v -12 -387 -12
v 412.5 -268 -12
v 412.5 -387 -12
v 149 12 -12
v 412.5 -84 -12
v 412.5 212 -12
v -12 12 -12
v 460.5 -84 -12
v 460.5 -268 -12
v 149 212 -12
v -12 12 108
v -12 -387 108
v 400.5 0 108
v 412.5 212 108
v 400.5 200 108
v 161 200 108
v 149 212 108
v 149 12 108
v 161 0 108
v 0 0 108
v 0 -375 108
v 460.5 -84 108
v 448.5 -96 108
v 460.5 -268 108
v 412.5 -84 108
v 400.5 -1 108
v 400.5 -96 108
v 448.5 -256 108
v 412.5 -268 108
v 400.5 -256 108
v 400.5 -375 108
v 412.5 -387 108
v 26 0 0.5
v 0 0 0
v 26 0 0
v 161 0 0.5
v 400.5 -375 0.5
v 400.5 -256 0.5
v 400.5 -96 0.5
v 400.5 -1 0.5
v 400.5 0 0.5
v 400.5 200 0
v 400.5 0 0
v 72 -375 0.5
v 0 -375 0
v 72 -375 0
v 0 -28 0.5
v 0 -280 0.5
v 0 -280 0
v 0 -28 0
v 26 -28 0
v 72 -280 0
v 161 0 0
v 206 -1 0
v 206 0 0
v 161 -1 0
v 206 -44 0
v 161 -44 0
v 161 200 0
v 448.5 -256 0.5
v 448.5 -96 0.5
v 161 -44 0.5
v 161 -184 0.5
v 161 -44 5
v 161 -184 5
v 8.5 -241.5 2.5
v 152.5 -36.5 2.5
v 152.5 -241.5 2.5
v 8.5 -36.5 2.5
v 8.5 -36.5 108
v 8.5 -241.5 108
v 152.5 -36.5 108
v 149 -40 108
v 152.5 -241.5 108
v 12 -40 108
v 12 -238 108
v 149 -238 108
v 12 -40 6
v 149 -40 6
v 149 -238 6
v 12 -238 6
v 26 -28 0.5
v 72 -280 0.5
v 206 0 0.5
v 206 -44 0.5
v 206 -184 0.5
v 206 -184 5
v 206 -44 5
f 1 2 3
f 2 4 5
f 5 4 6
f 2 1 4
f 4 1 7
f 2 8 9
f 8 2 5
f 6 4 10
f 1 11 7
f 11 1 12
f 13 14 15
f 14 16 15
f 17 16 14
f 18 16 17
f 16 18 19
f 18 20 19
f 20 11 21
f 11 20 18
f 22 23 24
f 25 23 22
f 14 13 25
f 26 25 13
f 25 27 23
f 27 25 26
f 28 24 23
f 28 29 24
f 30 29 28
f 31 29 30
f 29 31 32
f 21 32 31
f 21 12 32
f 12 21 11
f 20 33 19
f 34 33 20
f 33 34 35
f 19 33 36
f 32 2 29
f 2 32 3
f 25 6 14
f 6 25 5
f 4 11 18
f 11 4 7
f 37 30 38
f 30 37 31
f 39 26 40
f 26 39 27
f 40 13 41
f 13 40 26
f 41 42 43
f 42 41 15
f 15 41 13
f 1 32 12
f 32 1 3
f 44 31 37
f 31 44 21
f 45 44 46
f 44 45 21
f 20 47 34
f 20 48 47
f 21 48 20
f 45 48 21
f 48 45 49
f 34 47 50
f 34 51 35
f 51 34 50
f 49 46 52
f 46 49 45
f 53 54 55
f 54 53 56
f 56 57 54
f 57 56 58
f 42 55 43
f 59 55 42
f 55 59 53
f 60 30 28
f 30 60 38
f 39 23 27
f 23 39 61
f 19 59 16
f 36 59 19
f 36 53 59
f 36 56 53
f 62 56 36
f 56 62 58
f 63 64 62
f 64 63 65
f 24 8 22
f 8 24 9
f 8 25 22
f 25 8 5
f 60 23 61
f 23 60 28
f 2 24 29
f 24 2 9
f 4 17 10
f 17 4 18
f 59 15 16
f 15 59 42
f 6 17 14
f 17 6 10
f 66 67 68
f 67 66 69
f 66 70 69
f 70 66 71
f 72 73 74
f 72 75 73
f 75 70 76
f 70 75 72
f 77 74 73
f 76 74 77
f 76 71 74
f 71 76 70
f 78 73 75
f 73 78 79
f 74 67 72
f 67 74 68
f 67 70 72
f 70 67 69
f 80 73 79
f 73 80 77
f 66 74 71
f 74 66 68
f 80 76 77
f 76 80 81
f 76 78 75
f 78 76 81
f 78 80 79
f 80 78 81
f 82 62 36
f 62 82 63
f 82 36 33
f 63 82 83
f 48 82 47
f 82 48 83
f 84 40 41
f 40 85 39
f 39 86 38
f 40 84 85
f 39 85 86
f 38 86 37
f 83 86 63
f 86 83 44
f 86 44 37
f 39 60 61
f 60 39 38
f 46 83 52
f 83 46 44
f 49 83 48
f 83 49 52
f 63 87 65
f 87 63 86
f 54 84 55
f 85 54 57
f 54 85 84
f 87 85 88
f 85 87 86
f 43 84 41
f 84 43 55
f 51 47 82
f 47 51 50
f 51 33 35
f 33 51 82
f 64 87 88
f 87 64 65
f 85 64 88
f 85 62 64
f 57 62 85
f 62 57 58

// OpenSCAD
// Jim's basement recording studio
// all units in inches

concrete_height = 9 * 12;
slab_thickness = 12;

basement = [400.5, 375, concrete_height];
jutout = [48, 160];

// Original uncarpeted area:
//studio = [161, 173];

// Alloted space from back wall:
studio = [161,250];
// Useless corner space dedicated to water main pipe and valve:
nw_corner_water_main = [26, 28];

// How much space to leave between concrete and studio walls:
studio_inner_cut = [12, 12];

// draw outer walls minus ceiling (so we can look down in):
module walls(extents, height, thickness, north=true,east=true,south=true,west=true,floor=true) {
    nthick = north ? thickness : 0;
    ethick = east ? thickness : 0;
    sthick = south ? thickness : 0;
    wthick = west ? thickness : 0;
    union() {
        if (north) {
            translate([-wthick, -nthick, -thickness])
                linear_extrude(height+thickness)
                square([extents[0]+wthick+ethick, nthick]);
        }
        if (east) {
            translate([extents[0], -nthick, -thickness])
                linear_extrude(height+thickness)
                square([ethick, extents[1]+nthick+sthick]);
        }
        if (south) {
            translate([-wthick, extents[1], -thickness])
                linear_extrude(height+thickness)
                square([extents[0]+wthick+ethick, sthick]);
        }
        if (west) {
            translate([-wthick, -nthick, -thickness])
                linear_extrude(height+thickness)
                square([wthick, extents[1]+nthick+sthick]);
        }
        if (floor) {
            translate([-wthick, -nthick, -thickness])
                linear_extrude(thickness)
                square([extents[0]+wthick+ethick, extents[1]+nthick+sthick]);
        }
    }
}

// TODO: draw stairwell
module stairwell(extents) {
    linear_extrude(5)
    square(extents);
}

// Flip Y-coordinate:
mirror([0,1,0]) {
    // Basement walls:
    color("gray", 0.5)
        union() {
            difference() {
                walls(basement, concrete_height, slab_thickness);
                // jut out:
                translate([basement[0]-1,96,0])
                    linear_extrude(concrete_height+1)
                    square(jutout);
                // utility room:
                translate([studio[0],1,0])
                    mirror([0,1,0])
                    linear_extrude(concrete_height+1)
                    square([basement[0]-studio[0], slab_thickness+2]);
            }
            // jut out:
            translate([basement[0],96,0])
                walls(jutout, concrete_height, slab_thickness, west=false);
            // utility room:
            translate([studio[0],-200,0])
                walls([basement[0]-studio[0], 200], concrete_height, slab_thickness, south=false);
        }

    // Carpeted area:
    color("silver", 1)
        linear_extrude(0.5)
        union() {
            difference() {
                // Full extent of the basement:
                square([basement[0],basement[1]]);
                // Subtract non-carpeted studio areas:
                square(studio);
                square(nw_corner_water_main);
                // Subtract area behind stairwell:
                translate([studio[0],0,0])
                    square([45, 44]);
                // Subtract stairwell:
                translate([studio[0],0,0])
                    square([45, 44+140]);
                // Workout corner area:
                translate([0,basement[1],0])
                    mirror([0,1,0])
                    square([72,95]);
            }
            translate([basement[0],96,0])
                square(jutout);
        }

    // Studio area:
    color("green", 1)
        translate([0,0,0])
        linear_extrude(0.5)
        difference() {
            square(studio);
            square(nw_corner_water_main);
        }
    
    // Studio room inner:
    color("blue")
        translate(studio_inner_cut + [0, nw_corner_water_main[1]])
        translate([0, 0, 6])
        walls(studio - [0, nw_corner_water_main[1]] - studio_inner_cut * 2, concrete_height - 6, 3.5);

    // Stairwell:
    color("brown")
        translate([studio[0],44,0])
        stairwell([45, 140]);

}
